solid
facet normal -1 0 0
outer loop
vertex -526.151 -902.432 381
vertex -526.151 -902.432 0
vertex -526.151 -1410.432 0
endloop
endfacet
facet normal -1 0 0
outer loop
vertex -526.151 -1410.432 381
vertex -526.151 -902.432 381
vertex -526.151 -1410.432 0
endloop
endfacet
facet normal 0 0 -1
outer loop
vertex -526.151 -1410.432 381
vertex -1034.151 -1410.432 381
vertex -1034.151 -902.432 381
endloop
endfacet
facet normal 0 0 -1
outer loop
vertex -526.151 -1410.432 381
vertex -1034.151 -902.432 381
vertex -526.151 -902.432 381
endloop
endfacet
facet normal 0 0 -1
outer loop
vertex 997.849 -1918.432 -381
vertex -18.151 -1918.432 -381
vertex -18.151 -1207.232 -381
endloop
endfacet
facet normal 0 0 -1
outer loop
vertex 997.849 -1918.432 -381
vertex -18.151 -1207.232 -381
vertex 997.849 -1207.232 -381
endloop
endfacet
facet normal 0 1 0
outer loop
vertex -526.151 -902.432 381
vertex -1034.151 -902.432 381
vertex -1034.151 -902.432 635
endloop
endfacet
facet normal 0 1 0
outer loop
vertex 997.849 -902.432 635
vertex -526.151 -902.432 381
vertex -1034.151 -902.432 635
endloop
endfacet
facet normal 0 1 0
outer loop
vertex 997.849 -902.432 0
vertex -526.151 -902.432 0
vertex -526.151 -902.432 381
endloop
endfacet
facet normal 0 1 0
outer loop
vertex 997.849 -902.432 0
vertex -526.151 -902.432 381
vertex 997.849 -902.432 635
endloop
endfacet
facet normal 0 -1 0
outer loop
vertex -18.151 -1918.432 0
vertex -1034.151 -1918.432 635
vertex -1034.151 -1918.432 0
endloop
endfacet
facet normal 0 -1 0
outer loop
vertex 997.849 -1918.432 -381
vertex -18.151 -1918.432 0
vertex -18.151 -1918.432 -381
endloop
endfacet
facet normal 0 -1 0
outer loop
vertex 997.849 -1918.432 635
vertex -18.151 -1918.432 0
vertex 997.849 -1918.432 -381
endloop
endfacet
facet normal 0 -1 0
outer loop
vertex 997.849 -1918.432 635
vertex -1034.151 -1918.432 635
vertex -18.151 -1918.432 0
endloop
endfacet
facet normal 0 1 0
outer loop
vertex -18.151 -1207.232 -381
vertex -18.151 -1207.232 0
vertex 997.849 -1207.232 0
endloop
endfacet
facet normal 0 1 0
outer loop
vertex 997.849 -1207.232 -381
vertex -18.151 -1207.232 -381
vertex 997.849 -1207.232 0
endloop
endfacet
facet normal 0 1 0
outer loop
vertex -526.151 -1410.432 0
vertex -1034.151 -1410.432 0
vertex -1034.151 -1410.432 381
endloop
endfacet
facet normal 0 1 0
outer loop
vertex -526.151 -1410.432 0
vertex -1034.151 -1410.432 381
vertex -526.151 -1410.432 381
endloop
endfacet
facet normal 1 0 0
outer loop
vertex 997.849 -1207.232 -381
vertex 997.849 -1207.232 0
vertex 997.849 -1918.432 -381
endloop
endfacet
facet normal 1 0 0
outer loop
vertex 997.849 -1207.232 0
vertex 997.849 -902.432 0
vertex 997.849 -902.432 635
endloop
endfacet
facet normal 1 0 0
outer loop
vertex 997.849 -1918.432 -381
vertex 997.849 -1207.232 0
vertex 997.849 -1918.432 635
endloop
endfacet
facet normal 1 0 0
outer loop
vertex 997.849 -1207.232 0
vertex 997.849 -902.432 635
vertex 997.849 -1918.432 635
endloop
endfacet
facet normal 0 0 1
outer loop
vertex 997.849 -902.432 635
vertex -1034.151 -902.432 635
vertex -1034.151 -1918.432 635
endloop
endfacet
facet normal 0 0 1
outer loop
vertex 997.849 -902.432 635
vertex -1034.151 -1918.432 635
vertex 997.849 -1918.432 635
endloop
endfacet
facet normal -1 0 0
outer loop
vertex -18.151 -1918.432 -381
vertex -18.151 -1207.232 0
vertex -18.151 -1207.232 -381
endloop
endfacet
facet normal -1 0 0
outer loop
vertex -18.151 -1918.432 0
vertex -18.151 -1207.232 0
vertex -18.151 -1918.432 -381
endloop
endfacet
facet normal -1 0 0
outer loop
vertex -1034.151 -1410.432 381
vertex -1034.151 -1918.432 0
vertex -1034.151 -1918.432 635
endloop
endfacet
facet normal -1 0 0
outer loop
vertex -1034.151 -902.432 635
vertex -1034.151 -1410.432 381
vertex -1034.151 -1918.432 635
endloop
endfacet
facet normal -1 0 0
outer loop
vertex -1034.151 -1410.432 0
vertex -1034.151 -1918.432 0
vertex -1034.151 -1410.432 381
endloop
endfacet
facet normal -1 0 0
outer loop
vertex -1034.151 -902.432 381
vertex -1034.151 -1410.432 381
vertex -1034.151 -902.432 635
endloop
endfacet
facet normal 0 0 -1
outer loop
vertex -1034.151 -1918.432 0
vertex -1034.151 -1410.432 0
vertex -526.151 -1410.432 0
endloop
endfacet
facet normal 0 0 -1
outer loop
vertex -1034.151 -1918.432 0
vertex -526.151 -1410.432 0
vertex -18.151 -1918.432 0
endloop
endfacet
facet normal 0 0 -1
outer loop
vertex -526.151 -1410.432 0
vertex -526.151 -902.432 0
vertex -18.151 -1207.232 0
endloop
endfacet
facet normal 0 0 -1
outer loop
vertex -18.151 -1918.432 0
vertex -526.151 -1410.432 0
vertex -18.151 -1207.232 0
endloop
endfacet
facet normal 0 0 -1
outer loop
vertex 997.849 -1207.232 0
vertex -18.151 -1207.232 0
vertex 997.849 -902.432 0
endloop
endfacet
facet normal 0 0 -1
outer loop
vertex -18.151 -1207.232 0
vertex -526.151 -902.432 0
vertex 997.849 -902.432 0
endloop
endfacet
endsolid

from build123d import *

# Parameters (mm, degrees)
F0_W     = 2032
F0_H     = 1016
F1_DEPTH = 635
F2_W     = 1016
F2_H     = 711.2
F3_DEPTH = 381
F4_W     = 508
F4_H     = 508
F5_DEPTH = 381


with BuildPart() as f1:
    # F0 (on Top) → F1 (new body)
    with BuildSketch(Plane.XY):
        with Locations((-18.151204, -1410.432026)):
            Rectangle(F0_W, F0_H)
    extrude(amount=F1_DEPTH)

    # F2 (on face) → F3 (join)
    with BuildSketch(Plane(origin=(0, 0, 0), x_dir=(1, 0, 0), z_dir=(0, 0, -1))):
        with Locations((489.848796, 1562.832026)):
            Rectangle(F2_W, F2_H)
    extrude(amount=F3_DEPTH)

    # F4 (on face) → F5 (cut)
    with BuildSketch(Plane(origin=(0, 0, 0), x_dir=(1, 0, 0), z_dir=(0, 0, -1))):
        with Locations((-780.151204, 1156.432026)):
            Rectangle(F4_W, F4_H)
    extrude(amount=-F5_DEPTH, mode=Mode.SUBTRACT)


solid = f1.part
